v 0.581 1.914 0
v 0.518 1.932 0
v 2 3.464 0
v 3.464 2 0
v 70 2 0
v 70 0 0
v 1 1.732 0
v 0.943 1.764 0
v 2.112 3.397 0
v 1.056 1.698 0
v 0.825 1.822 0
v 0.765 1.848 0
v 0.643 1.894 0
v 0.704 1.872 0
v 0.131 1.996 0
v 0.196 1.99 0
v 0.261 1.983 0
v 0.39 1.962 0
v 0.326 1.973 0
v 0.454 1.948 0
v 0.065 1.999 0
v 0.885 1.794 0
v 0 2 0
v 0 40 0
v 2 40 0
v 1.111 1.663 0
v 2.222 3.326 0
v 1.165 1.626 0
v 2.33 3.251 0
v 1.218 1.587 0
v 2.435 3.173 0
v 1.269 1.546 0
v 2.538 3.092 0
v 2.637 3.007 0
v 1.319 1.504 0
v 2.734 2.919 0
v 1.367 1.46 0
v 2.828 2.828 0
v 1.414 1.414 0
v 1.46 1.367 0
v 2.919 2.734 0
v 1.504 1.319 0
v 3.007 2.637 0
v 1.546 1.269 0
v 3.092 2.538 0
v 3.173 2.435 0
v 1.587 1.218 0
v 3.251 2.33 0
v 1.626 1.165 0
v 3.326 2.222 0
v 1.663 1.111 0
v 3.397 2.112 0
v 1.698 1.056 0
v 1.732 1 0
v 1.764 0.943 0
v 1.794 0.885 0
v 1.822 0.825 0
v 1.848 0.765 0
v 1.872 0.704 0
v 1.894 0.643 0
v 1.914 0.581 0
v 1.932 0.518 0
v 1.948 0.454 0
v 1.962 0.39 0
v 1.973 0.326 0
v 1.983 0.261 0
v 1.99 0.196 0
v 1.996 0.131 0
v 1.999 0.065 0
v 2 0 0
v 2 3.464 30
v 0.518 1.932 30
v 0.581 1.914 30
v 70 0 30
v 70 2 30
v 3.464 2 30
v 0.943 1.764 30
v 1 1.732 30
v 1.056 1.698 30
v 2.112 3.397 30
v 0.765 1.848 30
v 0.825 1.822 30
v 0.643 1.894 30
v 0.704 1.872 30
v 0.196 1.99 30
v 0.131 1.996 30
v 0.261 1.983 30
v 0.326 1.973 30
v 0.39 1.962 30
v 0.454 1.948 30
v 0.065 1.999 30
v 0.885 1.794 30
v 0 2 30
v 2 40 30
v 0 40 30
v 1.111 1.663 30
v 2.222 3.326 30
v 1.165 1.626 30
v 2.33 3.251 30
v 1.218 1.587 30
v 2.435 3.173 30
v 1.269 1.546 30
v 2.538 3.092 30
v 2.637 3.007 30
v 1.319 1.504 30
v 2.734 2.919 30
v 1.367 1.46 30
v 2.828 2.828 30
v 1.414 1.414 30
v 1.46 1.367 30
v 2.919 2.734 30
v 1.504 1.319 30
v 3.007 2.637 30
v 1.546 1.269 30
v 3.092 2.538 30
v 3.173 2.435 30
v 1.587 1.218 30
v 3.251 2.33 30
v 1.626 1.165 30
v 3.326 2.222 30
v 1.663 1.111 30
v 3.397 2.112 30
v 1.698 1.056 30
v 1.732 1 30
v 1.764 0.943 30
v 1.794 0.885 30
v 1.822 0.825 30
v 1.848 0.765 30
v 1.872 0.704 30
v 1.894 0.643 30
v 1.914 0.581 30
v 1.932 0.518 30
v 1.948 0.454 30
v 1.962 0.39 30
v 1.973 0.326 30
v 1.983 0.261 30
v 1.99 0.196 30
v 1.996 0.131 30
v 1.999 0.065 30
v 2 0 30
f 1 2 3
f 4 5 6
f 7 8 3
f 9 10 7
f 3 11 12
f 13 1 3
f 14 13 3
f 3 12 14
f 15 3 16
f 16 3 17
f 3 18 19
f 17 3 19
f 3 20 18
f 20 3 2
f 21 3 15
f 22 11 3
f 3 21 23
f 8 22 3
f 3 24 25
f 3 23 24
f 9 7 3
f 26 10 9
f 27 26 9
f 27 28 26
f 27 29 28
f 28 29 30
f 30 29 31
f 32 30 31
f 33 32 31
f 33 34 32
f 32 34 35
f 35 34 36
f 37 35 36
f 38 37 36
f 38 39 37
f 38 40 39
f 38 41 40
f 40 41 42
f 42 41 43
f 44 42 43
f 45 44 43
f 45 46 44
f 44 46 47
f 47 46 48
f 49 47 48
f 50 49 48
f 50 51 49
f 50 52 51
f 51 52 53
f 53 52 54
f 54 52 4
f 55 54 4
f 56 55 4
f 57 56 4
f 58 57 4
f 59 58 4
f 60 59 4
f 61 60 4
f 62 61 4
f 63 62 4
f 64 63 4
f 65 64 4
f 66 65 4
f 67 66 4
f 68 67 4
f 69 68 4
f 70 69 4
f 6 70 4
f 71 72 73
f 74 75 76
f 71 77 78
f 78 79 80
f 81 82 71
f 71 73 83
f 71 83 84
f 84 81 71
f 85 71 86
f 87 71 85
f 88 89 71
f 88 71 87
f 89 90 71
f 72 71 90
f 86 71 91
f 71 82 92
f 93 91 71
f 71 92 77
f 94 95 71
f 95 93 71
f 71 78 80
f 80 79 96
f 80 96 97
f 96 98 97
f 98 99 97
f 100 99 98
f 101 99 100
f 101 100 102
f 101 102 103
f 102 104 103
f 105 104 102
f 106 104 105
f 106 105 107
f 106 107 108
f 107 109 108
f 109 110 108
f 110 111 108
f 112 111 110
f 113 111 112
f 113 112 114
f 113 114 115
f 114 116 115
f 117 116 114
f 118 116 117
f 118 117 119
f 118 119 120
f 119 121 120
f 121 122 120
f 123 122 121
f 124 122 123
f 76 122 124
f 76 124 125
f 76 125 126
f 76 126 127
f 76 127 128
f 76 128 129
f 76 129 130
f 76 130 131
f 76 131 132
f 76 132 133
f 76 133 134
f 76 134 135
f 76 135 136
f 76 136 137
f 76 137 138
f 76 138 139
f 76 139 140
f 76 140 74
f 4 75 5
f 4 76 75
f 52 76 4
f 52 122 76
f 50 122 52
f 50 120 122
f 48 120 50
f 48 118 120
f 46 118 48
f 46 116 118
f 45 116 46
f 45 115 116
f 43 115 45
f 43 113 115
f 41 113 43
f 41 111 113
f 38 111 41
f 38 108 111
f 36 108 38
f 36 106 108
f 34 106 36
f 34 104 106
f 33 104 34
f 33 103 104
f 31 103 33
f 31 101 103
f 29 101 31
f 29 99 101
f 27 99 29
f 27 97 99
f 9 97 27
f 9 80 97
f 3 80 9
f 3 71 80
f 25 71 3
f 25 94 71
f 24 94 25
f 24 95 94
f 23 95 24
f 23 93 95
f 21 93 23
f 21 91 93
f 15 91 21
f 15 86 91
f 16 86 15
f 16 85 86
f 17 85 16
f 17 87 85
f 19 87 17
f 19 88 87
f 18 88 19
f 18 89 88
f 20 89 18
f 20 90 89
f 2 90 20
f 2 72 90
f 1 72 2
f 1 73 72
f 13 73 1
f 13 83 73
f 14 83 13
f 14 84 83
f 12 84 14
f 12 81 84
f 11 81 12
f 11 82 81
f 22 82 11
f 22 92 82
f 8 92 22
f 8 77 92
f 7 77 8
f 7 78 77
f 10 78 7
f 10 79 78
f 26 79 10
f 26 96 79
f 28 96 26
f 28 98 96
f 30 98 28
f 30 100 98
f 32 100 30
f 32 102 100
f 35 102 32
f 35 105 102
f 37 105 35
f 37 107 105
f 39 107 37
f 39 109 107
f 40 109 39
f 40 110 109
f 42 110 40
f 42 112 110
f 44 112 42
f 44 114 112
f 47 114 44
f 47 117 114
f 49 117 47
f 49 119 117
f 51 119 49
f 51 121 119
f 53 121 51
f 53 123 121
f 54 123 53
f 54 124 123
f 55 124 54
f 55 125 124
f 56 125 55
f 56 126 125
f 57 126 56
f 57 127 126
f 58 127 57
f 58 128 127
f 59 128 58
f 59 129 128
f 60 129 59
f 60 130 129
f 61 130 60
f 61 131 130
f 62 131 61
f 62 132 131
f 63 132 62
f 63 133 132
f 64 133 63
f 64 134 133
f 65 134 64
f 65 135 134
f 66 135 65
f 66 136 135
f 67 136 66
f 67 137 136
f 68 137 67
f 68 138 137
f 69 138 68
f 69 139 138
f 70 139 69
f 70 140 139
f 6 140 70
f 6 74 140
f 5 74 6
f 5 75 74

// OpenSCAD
$fn = 192;

thickness_mm = 2.0;
width_mm = 30.0;
flange_a_out_mm = 70.0;
flange_b_out_mm = 40.0;
bend_radius_mm = 2.0;
k_factor = 0.45;
bend_angle_deg = 90.0;

bend_angle_rad = bend_angle_deg * PI / 180.0;
neutral_radius_mm = bend_radius_mm + k_factor * thickness_mm;
outer_to_neutral_offset_mm = (1.0 - k_factor) * thickness_mm;
flange_a_neutral_mm = flange_a_out_mm - outer_to_neutral_offset_mm;
flange_b_neutral_mm = flange_b_out_mm - outer_to_neutral_offset_mm;
bend_allowance_mm = bend_angle_rad * neutral_radius_mm;
developed_flat_length_mm = flange_a_neutral_mm + flange_b_neutral_mm + bend_allowance_mm;

echo(str(
    "MAKERBENCH-SHEETMETAL: {",
    "\"thickness_mm\":", thickness_mm,
    ", \"bend_radius_mm\":", bend_radius_mm,
    ", \"developed_flat_length_mm\":", developed_flat_length_mm,
    "}"
));

module bracket_profile_2d() {
    difference() {
        union() {
            square([flange_a_out_mm, thickness_mm]);
            square([thickness_mm, flange_b_out_mm]);
        }
        intersection() {
            square([bend_radius_mm, bend_radius_mm]);
            circle(r = bend_radius_mm, $fn = 192);
        }
    }
}

module bend_wall_2d() {
    intersection() {
        difference() {
            circle(r = bend_radius_mm + thickness_mm, $fn = 192);
            circle(r = bend_radius_mm, $fn = 192);
        }
        square([bend_radius_mm + thickness_mm, bend_radius_mm + thickness_mm]);
    }
}

linear_extrude(height = width_mm) {
    union() {
        bracket_profile_2d();
        bend_wall_2d();
    }
}
